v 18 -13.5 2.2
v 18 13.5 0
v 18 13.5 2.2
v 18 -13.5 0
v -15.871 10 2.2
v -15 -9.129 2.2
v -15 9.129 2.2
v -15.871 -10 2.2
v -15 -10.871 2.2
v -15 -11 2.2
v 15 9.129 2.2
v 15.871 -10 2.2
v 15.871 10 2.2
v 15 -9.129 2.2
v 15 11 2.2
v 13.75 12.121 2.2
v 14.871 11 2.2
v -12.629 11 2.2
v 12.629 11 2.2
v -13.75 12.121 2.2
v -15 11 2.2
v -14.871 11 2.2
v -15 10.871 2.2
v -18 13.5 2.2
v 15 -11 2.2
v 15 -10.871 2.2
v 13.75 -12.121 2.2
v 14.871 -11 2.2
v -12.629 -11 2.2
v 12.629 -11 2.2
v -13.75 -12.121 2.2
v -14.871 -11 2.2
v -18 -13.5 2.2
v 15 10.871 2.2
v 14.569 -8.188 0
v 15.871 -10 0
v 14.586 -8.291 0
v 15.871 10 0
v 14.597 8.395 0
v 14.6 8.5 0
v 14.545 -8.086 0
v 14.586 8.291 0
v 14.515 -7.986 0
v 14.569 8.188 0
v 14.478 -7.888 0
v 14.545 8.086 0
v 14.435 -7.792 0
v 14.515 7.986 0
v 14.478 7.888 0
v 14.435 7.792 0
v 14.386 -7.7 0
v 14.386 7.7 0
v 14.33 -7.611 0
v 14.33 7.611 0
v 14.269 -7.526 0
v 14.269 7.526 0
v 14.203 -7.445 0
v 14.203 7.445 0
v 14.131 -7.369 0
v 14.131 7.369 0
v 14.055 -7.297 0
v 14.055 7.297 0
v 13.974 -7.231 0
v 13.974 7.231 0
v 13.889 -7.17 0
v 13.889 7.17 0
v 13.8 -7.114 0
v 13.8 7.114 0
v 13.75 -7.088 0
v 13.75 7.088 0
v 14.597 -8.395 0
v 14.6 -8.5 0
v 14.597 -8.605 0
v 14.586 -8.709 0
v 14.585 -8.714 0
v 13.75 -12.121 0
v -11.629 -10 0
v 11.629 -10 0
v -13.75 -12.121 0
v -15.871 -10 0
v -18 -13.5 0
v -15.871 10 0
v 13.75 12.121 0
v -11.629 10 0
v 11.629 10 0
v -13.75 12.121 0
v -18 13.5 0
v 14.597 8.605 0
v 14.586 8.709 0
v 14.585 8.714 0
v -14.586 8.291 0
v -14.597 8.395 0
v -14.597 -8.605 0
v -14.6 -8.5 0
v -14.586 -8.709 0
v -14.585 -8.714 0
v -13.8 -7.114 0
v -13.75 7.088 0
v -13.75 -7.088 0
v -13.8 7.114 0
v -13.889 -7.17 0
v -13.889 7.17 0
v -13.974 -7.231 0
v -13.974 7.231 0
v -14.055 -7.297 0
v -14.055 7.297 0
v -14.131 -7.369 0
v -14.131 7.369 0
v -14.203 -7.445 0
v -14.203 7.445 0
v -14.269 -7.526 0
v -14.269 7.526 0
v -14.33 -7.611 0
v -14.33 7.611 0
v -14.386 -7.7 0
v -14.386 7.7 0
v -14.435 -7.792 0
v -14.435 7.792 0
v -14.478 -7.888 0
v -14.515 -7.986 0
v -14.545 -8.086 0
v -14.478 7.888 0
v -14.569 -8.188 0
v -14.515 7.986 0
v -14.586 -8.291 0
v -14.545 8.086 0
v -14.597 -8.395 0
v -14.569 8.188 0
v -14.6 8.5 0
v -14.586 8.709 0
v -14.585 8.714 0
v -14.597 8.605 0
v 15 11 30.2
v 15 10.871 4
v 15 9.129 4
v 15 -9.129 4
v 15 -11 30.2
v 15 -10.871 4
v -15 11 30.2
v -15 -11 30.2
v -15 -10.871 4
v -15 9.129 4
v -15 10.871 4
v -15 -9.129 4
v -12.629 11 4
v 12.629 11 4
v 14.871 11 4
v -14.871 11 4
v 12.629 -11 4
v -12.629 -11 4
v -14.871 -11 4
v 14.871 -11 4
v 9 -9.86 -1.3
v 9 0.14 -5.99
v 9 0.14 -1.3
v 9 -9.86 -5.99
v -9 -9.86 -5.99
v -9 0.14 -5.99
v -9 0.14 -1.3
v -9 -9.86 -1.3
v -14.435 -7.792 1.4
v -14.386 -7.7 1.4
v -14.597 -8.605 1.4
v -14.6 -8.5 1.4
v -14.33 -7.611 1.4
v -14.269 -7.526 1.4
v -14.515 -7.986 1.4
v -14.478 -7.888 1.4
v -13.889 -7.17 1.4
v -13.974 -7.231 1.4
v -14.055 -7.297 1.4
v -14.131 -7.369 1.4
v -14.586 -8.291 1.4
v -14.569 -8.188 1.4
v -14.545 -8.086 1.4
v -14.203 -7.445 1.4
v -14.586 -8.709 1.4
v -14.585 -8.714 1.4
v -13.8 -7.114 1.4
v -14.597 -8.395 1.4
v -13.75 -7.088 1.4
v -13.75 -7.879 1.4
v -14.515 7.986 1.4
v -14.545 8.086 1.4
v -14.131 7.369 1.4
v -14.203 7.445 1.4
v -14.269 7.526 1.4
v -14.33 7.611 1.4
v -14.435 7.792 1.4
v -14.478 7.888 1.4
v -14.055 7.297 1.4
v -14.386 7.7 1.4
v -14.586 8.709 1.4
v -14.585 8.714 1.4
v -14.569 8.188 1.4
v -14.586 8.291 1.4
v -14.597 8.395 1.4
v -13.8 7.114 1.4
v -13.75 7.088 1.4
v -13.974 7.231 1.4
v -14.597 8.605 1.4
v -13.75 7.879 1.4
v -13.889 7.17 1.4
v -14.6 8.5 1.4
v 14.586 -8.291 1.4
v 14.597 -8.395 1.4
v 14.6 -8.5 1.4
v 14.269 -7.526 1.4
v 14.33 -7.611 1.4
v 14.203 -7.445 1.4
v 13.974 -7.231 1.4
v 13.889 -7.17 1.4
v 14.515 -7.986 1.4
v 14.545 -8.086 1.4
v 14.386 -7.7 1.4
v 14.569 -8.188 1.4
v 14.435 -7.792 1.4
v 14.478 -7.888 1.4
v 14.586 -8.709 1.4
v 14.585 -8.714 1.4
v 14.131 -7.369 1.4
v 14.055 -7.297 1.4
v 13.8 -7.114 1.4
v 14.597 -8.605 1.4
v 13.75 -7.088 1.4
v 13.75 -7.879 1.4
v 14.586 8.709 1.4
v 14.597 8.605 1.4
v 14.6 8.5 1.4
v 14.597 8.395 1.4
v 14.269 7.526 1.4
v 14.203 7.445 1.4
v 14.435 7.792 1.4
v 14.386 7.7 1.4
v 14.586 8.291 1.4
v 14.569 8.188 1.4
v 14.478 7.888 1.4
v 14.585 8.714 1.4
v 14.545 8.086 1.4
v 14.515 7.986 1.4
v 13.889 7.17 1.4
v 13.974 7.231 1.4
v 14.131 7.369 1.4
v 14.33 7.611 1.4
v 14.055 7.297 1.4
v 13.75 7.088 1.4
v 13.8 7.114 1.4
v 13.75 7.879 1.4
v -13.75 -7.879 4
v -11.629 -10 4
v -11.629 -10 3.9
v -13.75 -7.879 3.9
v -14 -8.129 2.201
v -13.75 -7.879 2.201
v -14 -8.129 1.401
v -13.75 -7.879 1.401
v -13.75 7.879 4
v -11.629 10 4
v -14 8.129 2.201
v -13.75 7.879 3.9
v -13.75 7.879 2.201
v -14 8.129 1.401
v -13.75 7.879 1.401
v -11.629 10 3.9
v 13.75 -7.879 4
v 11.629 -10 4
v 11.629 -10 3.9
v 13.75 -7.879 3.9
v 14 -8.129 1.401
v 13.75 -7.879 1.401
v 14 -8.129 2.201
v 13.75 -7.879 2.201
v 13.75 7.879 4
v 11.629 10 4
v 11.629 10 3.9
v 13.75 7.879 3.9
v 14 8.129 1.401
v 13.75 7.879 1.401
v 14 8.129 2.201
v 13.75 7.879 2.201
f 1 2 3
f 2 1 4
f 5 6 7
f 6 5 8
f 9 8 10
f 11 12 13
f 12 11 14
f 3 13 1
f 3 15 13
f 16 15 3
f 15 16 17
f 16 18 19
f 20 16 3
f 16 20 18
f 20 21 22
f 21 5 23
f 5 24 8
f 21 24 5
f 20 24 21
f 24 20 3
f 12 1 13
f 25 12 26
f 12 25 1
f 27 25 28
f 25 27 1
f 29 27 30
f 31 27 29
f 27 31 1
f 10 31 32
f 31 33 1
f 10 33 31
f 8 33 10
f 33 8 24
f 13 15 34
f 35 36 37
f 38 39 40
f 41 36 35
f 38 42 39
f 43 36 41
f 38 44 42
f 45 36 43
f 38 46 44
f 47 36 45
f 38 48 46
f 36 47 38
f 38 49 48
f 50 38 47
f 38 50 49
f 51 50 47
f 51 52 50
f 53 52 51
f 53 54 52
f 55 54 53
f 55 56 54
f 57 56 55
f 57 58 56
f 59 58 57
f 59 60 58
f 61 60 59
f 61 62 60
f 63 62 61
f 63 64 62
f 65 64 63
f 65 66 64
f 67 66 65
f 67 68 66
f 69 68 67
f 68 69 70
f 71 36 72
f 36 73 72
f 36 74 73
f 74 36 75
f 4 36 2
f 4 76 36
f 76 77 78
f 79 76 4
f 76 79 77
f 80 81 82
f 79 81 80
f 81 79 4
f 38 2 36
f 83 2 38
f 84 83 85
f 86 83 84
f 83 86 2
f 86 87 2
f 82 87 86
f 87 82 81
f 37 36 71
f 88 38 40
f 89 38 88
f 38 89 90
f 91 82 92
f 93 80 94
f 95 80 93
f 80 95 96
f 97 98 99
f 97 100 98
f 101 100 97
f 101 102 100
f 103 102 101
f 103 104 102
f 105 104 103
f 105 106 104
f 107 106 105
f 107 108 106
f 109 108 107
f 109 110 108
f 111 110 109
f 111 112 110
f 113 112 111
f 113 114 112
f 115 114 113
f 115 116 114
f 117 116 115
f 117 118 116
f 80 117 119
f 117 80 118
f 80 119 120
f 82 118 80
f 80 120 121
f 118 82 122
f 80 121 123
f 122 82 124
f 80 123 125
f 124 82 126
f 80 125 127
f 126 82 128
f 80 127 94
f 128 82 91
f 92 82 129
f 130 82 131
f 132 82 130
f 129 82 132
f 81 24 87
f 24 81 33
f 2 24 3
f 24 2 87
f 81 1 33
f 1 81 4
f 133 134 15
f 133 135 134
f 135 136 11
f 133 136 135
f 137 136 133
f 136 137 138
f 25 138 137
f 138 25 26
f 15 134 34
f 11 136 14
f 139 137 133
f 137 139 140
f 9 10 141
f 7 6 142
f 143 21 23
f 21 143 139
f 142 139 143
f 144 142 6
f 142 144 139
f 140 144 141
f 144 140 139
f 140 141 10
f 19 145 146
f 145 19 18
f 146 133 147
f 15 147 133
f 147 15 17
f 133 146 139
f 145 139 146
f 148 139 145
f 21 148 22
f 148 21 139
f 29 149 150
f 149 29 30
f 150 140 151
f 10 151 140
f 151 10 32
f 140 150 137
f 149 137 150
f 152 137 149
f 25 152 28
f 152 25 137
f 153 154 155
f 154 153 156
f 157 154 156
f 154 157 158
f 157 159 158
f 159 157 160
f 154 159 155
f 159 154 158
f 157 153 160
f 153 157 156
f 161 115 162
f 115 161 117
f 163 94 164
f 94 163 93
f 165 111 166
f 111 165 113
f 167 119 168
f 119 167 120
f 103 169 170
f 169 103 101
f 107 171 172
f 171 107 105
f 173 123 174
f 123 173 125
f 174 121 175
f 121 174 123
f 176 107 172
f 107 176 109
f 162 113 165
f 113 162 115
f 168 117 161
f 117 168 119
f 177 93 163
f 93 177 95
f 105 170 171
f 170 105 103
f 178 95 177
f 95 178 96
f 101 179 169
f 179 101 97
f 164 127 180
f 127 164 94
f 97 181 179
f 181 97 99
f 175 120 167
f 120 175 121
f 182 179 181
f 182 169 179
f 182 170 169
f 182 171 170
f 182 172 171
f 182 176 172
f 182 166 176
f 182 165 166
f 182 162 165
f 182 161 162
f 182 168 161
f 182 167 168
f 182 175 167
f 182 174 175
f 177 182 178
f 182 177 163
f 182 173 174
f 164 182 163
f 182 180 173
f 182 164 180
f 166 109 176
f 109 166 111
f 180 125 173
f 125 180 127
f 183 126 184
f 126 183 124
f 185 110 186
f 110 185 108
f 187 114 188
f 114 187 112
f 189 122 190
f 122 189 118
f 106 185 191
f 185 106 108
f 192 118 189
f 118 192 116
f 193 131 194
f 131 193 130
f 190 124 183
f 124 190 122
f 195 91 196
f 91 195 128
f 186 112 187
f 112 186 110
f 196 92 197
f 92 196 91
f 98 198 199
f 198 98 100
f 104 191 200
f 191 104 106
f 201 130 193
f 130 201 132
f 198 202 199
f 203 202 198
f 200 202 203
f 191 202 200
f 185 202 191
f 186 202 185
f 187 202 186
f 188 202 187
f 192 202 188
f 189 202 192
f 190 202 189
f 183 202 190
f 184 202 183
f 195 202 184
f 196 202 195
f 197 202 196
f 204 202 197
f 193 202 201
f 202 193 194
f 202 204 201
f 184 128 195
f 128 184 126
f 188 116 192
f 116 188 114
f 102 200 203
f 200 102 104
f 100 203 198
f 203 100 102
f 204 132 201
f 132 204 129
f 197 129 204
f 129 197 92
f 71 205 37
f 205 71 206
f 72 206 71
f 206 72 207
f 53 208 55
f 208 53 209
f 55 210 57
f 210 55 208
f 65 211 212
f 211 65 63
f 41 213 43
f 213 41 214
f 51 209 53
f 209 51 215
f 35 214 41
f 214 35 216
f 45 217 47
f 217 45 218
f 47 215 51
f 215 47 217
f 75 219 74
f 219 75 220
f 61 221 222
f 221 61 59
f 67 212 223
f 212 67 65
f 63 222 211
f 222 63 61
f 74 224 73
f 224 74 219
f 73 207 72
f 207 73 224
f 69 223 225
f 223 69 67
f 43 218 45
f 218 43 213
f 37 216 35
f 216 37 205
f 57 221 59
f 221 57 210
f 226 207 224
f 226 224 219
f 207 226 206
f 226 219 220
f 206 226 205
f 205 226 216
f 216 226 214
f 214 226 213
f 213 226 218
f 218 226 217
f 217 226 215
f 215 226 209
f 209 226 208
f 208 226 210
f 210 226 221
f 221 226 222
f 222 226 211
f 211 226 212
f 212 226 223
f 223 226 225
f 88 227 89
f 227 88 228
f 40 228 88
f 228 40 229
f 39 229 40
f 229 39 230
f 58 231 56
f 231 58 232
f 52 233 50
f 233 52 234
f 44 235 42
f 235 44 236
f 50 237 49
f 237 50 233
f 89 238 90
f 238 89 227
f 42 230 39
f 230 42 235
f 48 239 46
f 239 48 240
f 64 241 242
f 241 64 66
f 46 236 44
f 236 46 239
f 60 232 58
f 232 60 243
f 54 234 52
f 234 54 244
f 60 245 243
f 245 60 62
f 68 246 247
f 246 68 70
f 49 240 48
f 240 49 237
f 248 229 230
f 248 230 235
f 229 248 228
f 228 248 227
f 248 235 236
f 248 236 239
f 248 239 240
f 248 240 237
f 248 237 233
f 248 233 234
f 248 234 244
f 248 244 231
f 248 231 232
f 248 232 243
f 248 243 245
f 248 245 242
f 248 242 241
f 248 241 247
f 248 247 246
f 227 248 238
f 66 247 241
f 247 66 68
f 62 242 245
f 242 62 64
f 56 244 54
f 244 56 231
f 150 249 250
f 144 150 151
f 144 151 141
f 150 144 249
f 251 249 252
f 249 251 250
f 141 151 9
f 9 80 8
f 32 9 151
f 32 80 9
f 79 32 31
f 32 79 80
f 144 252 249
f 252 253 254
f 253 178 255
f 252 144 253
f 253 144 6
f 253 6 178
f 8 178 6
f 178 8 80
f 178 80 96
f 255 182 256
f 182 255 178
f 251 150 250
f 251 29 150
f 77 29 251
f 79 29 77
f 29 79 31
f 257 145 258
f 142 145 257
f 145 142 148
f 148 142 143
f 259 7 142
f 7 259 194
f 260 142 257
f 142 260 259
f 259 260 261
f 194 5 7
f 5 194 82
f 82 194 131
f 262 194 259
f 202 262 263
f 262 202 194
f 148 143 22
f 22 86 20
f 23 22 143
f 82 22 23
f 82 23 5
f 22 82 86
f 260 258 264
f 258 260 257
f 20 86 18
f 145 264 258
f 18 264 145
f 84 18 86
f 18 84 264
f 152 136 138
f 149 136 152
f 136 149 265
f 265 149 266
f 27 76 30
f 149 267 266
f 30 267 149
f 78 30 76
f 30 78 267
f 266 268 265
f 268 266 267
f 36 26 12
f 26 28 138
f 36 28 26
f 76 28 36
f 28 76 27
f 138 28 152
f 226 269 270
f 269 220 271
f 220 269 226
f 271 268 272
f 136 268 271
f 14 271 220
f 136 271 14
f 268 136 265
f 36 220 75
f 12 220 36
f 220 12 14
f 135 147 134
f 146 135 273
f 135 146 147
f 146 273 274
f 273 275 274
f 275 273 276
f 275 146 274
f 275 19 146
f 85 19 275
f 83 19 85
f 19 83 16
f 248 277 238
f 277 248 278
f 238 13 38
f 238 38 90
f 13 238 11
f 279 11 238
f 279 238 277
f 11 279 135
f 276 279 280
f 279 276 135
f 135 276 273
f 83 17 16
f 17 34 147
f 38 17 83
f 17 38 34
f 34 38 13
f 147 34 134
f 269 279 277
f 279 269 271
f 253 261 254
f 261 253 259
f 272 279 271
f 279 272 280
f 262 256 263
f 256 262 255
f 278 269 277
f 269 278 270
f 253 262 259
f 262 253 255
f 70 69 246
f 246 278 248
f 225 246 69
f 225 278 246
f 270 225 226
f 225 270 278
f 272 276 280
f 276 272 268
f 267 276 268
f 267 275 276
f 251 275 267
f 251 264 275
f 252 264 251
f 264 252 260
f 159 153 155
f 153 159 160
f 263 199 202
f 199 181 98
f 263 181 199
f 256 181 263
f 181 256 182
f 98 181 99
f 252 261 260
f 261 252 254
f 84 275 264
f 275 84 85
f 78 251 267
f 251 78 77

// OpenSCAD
$fn=96;

// IEC fused inlet module (old style) - simplified parametric model
// Overall faceplate: 36 x 27 mm
// Includes: faceplate, main body, fuse drawer bump, and two mounting holes.

module iec_fused_inlet_old(
    face_w=36.0,
    face_h=27.0,
    face_t=2.2,

    body_w=30.0,
    body_h=22.0,
    body_d=28.0,

    // Fuse drawer bump (front protrusion)
    fuse_w=18.0,
    fuse_h=10.0,
    fuse_d=6.0,

    // Mounting holes (typical M3 clearance)
    hole_d=3.2,
    hole_x= (36.0/2 - 5.0),   // distance from center to hole in X
    hole_y= (27.0/2 - 5.0),   // distance from center to hole in Y

    // Cosmetic recess on face
    recess_w=28.0,
    recess_h=18.0,
    recess_d=0.8,

    // IEC C14 opening (approx)
    c14_w=27.5,
    c14_h=20.0,
    c14_d=3.0
){
    difference() {
        union() {
            // Faceplate centered at origin, front at Z=0, body extends to +Z
            translate([0,0,face_t/2])
                cube([face_w, face_h, face_t], center=true);

            // Main body behind faceplate
            translate([0,0,face_t + body_d/2])
                cube([body_w, body_h, body_d], center=true);

            // Fuse drawer bump on front (protrudes out of faceplate)
            translate([0, -face_h*0.18, -fuse_d/2 + 0.01])
                cube([fuse_w, fuse_h, fuse_d], center=true);
        }

        // Mounting holes through faceplate
        for (sx=[-1,1], sy=[-1,1]) {
            translate([sx*hole_x, sy*hole_y, 0])
                cylinder(d=hole_d, h=face_t+0.6, center=true);
        }

        // Cosmetic recess on faceplate
        translate([0,0,face_t - recess_d/2 + 0.001])
            cube([recess_w, recess_h, recess_d], center=true);

        // IEC C14 opening through faceplate and slightly into body
        translate([0,0,face_t/2 + 0.2])
            cube([c14_w, c14_h, face_t + c14_d], center=true);

        // Small chamfer-like corner reliefs (approx) on opening
        for (sx=[-1,1], sy=[-1,1]) {
            translate([sx*(c14_w/2), sy*(c14_h/2), face_t/2 + 0.2])
                rotate([0,0,45])
                    cube([3.0,3.0,face_t + c14_d + 0.2], center=true);
        }
    }
}

// Render
iec_fused_inlet_old();
